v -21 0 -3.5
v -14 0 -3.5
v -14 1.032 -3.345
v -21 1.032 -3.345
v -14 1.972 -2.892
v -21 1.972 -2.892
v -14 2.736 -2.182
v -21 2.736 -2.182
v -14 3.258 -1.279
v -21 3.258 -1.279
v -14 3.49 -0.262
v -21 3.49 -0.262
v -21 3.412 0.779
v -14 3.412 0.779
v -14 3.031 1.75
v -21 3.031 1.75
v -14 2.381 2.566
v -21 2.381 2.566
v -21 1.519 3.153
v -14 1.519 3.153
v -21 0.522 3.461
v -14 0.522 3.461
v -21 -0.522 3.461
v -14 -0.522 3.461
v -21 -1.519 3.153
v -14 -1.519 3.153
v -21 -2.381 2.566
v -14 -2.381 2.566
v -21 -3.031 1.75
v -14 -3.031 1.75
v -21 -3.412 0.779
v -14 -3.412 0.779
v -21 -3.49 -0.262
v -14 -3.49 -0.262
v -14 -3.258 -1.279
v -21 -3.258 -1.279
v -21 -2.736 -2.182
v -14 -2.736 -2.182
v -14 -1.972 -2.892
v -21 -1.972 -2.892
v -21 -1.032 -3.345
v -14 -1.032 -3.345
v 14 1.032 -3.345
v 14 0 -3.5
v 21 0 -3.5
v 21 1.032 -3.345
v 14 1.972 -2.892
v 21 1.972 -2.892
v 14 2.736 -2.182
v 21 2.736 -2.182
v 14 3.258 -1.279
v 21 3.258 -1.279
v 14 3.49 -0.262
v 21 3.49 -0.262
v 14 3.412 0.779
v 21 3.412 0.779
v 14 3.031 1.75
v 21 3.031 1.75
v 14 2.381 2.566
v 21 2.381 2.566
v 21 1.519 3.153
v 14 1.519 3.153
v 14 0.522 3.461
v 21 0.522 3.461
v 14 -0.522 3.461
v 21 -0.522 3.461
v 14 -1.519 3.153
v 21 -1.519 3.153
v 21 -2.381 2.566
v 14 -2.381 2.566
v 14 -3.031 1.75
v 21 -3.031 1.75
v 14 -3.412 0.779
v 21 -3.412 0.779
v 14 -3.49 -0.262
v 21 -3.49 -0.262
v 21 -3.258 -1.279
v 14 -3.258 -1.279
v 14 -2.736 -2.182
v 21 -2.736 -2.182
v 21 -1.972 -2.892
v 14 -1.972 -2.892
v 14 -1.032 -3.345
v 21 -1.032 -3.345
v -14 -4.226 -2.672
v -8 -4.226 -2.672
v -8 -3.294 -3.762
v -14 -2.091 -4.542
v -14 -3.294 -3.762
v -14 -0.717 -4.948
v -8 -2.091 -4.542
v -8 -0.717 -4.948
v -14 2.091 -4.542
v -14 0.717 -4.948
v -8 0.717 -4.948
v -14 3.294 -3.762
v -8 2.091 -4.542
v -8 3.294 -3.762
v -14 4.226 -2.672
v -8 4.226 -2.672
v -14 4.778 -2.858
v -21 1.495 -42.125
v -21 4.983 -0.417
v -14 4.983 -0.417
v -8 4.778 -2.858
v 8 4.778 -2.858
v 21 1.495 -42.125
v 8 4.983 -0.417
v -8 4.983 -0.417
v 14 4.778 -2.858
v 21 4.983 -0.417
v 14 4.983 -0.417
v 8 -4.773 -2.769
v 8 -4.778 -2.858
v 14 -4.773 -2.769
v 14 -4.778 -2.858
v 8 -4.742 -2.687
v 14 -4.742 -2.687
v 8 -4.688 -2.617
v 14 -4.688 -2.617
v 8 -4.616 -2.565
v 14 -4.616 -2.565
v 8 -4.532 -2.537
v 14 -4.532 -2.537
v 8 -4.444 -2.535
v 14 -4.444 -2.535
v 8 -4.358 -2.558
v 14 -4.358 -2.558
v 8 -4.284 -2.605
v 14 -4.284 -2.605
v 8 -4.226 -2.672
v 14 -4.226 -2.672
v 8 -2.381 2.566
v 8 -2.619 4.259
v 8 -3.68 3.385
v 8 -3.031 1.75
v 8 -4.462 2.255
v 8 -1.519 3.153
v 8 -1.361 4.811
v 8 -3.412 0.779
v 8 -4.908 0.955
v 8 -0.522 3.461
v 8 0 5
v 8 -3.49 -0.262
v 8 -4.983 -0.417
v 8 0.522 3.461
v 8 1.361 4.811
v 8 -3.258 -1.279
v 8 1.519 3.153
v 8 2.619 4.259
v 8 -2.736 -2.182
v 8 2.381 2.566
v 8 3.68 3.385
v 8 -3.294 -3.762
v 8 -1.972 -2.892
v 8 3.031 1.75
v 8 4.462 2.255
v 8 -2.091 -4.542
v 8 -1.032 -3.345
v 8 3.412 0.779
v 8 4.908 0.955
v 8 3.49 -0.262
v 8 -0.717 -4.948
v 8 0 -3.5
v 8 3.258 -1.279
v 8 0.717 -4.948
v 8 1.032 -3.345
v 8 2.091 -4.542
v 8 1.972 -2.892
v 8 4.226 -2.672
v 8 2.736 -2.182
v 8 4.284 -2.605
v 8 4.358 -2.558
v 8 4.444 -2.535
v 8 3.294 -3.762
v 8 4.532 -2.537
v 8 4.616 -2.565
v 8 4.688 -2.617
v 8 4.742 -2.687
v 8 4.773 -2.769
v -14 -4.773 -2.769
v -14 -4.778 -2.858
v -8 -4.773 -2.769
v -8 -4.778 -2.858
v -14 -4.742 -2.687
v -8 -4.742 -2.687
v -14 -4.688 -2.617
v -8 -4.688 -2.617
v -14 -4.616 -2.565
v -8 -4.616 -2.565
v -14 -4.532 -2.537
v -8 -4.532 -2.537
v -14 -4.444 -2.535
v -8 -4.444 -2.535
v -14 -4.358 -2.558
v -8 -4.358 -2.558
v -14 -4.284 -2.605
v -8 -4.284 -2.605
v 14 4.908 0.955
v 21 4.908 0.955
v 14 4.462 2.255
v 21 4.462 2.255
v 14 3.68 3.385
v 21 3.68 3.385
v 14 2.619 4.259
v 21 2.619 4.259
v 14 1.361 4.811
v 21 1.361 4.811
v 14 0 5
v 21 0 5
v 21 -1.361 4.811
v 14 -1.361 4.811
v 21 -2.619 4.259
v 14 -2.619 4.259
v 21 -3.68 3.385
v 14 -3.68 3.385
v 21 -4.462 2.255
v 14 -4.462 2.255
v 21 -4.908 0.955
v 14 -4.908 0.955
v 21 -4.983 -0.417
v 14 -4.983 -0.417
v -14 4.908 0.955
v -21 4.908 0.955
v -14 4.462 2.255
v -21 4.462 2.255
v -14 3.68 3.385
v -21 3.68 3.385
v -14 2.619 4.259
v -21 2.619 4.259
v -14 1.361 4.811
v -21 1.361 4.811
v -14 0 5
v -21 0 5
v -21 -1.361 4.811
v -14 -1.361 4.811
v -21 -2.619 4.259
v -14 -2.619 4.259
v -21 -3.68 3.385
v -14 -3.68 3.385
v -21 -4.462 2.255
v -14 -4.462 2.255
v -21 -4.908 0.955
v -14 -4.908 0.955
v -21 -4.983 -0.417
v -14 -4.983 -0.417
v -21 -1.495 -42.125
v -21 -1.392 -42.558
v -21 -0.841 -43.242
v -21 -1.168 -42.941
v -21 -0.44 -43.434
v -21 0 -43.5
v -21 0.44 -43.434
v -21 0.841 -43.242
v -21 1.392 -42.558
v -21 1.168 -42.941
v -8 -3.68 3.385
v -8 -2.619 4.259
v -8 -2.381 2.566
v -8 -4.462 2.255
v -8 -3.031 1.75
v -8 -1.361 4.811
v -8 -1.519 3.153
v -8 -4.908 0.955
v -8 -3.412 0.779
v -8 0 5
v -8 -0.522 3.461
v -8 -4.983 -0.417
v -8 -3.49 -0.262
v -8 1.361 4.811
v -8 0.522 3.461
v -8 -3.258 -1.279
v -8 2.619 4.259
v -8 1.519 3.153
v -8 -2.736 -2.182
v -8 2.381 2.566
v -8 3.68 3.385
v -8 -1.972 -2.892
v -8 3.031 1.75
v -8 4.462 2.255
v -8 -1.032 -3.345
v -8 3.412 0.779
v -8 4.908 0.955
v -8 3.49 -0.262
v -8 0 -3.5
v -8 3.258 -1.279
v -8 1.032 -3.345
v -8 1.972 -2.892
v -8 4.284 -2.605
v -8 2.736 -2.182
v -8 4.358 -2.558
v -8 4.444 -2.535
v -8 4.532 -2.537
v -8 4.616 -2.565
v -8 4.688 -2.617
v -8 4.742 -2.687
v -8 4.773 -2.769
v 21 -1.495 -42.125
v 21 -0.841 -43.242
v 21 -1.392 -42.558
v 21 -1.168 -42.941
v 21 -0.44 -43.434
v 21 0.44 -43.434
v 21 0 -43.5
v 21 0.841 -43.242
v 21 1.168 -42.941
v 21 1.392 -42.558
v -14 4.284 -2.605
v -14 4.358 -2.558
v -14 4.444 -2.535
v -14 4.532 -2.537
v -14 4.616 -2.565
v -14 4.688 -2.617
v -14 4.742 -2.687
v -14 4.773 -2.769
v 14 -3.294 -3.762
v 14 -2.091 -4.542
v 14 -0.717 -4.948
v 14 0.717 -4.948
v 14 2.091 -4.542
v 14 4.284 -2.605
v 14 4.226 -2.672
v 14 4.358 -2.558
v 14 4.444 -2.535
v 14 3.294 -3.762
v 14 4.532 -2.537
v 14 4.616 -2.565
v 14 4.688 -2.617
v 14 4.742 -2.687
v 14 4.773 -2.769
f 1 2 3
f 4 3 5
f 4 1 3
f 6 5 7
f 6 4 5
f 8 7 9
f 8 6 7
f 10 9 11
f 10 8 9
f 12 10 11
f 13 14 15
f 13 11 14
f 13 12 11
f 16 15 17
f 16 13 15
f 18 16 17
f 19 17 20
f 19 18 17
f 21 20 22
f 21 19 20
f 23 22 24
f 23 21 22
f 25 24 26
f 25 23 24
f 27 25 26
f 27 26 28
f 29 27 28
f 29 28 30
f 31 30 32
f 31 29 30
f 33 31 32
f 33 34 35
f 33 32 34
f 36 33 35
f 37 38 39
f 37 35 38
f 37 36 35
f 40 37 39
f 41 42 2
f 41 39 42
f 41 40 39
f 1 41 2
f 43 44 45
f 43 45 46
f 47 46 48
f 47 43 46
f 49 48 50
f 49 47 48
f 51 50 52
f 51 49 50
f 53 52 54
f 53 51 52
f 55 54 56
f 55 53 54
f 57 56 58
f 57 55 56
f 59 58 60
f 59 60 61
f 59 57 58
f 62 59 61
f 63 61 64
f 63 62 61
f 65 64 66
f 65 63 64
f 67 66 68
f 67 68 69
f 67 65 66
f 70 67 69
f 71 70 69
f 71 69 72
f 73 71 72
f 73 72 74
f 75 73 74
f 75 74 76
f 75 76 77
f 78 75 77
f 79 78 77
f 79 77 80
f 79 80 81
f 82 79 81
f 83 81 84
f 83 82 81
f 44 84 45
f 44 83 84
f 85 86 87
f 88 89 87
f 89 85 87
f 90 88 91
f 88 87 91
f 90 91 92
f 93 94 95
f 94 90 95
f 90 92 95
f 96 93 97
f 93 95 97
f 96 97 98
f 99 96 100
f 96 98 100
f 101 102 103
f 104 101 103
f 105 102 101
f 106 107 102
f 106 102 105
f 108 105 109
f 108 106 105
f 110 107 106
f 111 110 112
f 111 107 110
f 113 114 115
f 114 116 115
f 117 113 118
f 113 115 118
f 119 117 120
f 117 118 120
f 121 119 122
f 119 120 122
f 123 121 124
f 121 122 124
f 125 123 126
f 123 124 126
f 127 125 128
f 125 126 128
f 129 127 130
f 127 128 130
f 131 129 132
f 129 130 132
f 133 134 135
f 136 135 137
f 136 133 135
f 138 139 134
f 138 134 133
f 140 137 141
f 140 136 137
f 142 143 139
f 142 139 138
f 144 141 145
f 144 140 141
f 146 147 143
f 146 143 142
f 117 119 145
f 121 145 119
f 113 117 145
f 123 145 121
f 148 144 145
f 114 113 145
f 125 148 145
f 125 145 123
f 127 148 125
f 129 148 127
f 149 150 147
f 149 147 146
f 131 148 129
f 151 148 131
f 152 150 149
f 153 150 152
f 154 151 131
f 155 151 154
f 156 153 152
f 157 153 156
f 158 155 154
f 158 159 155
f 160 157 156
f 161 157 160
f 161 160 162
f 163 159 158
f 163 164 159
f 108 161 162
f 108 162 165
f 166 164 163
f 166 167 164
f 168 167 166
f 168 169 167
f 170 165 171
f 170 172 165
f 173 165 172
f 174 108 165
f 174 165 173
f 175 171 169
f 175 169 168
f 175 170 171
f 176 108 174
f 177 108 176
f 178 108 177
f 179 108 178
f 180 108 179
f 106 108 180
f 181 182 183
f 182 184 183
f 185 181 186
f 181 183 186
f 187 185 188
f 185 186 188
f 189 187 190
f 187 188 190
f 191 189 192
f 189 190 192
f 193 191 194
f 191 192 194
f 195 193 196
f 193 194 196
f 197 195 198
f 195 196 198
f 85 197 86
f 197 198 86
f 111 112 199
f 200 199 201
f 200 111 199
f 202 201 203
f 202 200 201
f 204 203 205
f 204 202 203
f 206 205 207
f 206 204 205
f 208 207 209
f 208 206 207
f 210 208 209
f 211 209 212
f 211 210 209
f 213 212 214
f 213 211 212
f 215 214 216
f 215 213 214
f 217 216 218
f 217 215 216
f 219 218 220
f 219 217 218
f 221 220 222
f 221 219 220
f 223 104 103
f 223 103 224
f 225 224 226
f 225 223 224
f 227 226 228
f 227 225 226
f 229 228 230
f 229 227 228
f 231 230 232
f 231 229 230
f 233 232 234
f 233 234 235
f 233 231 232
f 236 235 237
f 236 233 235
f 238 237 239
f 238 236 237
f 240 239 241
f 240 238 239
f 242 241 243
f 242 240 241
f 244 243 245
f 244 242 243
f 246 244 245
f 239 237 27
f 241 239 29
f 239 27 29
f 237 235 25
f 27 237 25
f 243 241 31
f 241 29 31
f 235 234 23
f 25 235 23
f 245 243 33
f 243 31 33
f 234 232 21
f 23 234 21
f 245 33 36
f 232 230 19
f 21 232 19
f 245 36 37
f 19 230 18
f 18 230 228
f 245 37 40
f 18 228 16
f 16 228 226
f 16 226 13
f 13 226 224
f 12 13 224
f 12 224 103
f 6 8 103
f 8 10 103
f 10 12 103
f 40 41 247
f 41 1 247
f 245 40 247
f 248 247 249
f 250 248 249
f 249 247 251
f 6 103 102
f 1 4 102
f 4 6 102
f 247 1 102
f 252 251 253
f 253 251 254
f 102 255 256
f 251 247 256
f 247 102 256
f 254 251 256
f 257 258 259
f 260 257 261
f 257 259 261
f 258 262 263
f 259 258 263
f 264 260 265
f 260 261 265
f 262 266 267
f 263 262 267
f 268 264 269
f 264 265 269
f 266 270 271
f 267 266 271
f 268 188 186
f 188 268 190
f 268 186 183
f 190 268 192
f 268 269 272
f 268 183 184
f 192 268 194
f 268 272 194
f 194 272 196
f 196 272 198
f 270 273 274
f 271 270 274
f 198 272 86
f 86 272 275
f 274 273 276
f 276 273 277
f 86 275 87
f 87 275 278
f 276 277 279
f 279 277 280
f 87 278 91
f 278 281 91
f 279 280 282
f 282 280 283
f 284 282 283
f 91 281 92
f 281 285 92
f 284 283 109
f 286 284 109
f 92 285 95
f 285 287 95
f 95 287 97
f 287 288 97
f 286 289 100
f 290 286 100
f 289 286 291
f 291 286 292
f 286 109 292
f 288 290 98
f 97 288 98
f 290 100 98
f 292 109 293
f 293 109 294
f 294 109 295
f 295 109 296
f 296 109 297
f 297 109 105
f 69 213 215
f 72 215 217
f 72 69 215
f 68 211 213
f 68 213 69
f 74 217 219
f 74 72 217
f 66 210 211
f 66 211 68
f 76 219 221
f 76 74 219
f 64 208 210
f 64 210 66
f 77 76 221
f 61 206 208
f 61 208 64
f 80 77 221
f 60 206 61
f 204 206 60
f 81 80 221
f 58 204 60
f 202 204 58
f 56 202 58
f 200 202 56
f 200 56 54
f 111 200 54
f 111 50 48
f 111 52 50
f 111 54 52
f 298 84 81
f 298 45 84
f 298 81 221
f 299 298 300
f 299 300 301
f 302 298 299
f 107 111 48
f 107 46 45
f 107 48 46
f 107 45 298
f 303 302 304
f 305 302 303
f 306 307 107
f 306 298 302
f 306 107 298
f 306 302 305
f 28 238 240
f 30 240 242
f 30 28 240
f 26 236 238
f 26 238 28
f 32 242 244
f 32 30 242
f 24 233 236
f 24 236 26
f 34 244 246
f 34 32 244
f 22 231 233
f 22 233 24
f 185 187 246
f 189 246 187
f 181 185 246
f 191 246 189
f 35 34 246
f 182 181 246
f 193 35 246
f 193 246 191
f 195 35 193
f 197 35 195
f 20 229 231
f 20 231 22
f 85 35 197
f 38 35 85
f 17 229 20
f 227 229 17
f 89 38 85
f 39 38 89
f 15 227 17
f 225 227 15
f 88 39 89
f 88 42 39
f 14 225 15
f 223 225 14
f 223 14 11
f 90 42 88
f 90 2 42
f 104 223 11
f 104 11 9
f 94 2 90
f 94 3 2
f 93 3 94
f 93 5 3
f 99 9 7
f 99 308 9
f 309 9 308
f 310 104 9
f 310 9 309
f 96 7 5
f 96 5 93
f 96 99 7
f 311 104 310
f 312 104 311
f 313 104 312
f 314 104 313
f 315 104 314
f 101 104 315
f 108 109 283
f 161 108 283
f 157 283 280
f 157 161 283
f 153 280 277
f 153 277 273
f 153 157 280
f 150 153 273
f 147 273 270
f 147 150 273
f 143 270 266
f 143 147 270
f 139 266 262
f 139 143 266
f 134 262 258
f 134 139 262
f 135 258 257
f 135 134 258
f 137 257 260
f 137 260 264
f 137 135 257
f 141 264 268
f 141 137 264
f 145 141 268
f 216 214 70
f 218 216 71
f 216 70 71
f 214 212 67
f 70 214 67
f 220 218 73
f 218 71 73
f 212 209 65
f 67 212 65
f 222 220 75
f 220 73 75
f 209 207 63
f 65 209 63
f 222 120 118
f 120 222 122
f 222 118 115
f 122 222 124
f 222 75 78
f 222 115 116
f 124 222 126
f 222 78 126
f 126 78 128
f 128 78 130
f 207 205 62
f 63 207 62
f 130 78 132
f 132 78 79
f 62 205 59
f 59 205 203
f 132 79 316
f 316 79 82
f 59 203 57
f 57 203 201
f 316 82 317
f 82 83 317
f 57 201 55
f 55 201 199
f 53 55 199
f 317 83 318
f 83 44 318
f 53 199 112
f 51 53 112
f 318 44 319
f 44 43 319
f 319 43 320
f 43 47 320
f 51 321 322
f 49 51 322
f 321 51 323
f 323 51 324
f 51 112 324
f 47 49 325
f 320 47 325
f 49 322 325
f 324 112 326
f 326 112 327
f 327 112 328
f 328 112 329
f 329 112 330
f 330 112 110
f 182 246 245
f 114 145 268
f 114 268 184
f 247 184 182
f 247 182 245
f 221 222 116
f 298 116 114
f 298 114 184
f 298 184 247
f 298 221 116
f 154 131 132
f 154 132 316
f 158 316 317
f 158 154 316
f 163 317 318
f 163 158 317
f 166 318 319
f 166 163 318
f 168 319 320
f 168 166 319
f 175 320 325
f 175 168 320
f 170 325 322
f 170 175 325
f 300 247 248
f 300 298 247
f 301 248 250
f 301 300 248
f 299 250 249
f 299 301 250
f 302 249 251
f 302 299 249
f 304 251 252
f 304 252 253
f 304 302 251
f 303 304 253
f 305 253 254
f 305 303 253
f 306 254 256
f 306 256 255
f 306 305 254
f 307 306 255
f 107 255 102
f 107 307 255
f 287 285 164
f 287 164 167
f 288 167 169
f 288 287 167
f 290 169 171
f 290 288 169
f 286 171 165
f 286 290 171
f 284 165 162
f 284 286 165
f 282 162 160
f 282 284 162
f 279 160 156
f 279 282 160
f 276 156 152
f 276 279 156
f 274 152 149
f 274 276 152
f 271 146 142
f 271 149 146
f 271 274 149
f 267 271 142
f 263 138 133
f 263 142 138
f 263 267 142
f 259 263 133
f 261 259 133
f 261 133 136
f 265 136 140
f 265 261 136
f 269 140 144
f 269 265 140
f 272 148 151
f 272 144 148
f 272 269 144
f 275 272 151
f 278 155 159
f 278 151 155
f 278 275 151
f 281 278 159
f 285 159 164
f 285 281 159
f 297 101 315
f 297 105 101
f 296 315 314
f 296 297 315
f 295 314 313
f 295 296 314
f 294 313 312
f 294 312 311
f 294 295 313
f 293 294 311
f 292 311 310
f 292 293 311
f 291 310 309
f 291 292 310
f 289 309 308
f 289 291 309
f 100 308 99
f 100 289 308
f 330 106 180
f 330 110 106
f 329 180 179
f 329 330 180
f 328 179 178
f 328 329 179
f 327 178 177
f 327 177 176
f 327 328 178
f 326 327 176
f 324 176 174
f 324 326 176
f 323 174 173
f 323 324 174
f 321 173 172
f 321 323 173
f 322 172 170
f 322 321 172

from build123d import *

# Parameters (mm, degrees)
SKETCH1_R           = 5
SKETCH1_R_2         = 3.5
SKETCH1_R_3         = 1.5
BOSS_EXTRUDE1_DEPTH = 21
CUT_EXTRUDE1_START  = 8
SKETCH1_3_R         = 5
CUT_EXTRUDE1_DEPTH  = 6
CUT_EXTRUDE2_START  = -8
SKETCH1_4_R         = 5
CUT_EXTRUDE2_DEPTH  = 6
FILLET1_R           = 0.3


with BuildPart() as part:
    # Sketch1 → Boss-Extrude1 (new body, symmetric)
    with BuildSketch(Plane(origin=(0, 0, 0), x_dir=(0, 0, -1), z_dir=(1, 0, 0))):
        with BuildLine():
            Line((42.125, 1.494782593), (0.416666667, 4.982608643))
            ThreePointArc((0.416666667, 4.982608643), (3.679900361, 3.385016002), (5, 0))
            ThreePointArc((5, 0), (3.679900361, -3.385016002), (0.416666667, -4.982608643))
            Line((0.416666667, -4.982608643), (42.125, -1.494782593))
            ThreePointArc((42.125, -1.494782593), (40.5, 0), (42.125, 1.494782593))
        make_face()
        Circle(SKETCH1_R)
        Circle(SKETCH1_R_2, mode=Mode.SUBTRACT)
        with Locations((42, 0)):
            Circle(SKETCH1_R_3)
    extrude(amount=BOSS_EXTRUDE1_DEPTH, both=True)

    # Sketch1<3> → Cut-Extrude1 (cut)
    with BuildSketch(Plane(origin=(0, 0, 0), x_dir=(0, 0, -1), z_dir=(1, 0, 0)).offset(CUT_EXTRUDE1_START)):
        Circle(SKETCH1_3_R)
    extrude(amount=CUT_EXTRUDE1_DEPTH, mode=Mode.SUBTRACT)

    # Sketch1<4> → Cut-Extrude2 (cut)
    with BuildSketch(Plane(origin=(0, 0, 0), x_dir=(0, 0, -1), z_dir=(1, 0, 0)).offset(CUT_EXTRUDE2_START)):
        Circle(SKETCH1_4_R)
    extrude(amount=-CUT_EXTRUDE2_DEPTH, mode=Mode.SUBTRACT)

    # Fillet1
    fillet1_edges = [part.edges().sort_by_distance(p)[0] for p in [
        (11, -4.982608643, -0.416666667),
        (11, 4.982608643, -0.416666667),
        (-11, 4.982608643, -0.416666667),
        (-11, -4.982608643, -0.416666667),
    ]]
    fillet(fillet1_edges, radius=FILLET1_R)


solid = part.part
